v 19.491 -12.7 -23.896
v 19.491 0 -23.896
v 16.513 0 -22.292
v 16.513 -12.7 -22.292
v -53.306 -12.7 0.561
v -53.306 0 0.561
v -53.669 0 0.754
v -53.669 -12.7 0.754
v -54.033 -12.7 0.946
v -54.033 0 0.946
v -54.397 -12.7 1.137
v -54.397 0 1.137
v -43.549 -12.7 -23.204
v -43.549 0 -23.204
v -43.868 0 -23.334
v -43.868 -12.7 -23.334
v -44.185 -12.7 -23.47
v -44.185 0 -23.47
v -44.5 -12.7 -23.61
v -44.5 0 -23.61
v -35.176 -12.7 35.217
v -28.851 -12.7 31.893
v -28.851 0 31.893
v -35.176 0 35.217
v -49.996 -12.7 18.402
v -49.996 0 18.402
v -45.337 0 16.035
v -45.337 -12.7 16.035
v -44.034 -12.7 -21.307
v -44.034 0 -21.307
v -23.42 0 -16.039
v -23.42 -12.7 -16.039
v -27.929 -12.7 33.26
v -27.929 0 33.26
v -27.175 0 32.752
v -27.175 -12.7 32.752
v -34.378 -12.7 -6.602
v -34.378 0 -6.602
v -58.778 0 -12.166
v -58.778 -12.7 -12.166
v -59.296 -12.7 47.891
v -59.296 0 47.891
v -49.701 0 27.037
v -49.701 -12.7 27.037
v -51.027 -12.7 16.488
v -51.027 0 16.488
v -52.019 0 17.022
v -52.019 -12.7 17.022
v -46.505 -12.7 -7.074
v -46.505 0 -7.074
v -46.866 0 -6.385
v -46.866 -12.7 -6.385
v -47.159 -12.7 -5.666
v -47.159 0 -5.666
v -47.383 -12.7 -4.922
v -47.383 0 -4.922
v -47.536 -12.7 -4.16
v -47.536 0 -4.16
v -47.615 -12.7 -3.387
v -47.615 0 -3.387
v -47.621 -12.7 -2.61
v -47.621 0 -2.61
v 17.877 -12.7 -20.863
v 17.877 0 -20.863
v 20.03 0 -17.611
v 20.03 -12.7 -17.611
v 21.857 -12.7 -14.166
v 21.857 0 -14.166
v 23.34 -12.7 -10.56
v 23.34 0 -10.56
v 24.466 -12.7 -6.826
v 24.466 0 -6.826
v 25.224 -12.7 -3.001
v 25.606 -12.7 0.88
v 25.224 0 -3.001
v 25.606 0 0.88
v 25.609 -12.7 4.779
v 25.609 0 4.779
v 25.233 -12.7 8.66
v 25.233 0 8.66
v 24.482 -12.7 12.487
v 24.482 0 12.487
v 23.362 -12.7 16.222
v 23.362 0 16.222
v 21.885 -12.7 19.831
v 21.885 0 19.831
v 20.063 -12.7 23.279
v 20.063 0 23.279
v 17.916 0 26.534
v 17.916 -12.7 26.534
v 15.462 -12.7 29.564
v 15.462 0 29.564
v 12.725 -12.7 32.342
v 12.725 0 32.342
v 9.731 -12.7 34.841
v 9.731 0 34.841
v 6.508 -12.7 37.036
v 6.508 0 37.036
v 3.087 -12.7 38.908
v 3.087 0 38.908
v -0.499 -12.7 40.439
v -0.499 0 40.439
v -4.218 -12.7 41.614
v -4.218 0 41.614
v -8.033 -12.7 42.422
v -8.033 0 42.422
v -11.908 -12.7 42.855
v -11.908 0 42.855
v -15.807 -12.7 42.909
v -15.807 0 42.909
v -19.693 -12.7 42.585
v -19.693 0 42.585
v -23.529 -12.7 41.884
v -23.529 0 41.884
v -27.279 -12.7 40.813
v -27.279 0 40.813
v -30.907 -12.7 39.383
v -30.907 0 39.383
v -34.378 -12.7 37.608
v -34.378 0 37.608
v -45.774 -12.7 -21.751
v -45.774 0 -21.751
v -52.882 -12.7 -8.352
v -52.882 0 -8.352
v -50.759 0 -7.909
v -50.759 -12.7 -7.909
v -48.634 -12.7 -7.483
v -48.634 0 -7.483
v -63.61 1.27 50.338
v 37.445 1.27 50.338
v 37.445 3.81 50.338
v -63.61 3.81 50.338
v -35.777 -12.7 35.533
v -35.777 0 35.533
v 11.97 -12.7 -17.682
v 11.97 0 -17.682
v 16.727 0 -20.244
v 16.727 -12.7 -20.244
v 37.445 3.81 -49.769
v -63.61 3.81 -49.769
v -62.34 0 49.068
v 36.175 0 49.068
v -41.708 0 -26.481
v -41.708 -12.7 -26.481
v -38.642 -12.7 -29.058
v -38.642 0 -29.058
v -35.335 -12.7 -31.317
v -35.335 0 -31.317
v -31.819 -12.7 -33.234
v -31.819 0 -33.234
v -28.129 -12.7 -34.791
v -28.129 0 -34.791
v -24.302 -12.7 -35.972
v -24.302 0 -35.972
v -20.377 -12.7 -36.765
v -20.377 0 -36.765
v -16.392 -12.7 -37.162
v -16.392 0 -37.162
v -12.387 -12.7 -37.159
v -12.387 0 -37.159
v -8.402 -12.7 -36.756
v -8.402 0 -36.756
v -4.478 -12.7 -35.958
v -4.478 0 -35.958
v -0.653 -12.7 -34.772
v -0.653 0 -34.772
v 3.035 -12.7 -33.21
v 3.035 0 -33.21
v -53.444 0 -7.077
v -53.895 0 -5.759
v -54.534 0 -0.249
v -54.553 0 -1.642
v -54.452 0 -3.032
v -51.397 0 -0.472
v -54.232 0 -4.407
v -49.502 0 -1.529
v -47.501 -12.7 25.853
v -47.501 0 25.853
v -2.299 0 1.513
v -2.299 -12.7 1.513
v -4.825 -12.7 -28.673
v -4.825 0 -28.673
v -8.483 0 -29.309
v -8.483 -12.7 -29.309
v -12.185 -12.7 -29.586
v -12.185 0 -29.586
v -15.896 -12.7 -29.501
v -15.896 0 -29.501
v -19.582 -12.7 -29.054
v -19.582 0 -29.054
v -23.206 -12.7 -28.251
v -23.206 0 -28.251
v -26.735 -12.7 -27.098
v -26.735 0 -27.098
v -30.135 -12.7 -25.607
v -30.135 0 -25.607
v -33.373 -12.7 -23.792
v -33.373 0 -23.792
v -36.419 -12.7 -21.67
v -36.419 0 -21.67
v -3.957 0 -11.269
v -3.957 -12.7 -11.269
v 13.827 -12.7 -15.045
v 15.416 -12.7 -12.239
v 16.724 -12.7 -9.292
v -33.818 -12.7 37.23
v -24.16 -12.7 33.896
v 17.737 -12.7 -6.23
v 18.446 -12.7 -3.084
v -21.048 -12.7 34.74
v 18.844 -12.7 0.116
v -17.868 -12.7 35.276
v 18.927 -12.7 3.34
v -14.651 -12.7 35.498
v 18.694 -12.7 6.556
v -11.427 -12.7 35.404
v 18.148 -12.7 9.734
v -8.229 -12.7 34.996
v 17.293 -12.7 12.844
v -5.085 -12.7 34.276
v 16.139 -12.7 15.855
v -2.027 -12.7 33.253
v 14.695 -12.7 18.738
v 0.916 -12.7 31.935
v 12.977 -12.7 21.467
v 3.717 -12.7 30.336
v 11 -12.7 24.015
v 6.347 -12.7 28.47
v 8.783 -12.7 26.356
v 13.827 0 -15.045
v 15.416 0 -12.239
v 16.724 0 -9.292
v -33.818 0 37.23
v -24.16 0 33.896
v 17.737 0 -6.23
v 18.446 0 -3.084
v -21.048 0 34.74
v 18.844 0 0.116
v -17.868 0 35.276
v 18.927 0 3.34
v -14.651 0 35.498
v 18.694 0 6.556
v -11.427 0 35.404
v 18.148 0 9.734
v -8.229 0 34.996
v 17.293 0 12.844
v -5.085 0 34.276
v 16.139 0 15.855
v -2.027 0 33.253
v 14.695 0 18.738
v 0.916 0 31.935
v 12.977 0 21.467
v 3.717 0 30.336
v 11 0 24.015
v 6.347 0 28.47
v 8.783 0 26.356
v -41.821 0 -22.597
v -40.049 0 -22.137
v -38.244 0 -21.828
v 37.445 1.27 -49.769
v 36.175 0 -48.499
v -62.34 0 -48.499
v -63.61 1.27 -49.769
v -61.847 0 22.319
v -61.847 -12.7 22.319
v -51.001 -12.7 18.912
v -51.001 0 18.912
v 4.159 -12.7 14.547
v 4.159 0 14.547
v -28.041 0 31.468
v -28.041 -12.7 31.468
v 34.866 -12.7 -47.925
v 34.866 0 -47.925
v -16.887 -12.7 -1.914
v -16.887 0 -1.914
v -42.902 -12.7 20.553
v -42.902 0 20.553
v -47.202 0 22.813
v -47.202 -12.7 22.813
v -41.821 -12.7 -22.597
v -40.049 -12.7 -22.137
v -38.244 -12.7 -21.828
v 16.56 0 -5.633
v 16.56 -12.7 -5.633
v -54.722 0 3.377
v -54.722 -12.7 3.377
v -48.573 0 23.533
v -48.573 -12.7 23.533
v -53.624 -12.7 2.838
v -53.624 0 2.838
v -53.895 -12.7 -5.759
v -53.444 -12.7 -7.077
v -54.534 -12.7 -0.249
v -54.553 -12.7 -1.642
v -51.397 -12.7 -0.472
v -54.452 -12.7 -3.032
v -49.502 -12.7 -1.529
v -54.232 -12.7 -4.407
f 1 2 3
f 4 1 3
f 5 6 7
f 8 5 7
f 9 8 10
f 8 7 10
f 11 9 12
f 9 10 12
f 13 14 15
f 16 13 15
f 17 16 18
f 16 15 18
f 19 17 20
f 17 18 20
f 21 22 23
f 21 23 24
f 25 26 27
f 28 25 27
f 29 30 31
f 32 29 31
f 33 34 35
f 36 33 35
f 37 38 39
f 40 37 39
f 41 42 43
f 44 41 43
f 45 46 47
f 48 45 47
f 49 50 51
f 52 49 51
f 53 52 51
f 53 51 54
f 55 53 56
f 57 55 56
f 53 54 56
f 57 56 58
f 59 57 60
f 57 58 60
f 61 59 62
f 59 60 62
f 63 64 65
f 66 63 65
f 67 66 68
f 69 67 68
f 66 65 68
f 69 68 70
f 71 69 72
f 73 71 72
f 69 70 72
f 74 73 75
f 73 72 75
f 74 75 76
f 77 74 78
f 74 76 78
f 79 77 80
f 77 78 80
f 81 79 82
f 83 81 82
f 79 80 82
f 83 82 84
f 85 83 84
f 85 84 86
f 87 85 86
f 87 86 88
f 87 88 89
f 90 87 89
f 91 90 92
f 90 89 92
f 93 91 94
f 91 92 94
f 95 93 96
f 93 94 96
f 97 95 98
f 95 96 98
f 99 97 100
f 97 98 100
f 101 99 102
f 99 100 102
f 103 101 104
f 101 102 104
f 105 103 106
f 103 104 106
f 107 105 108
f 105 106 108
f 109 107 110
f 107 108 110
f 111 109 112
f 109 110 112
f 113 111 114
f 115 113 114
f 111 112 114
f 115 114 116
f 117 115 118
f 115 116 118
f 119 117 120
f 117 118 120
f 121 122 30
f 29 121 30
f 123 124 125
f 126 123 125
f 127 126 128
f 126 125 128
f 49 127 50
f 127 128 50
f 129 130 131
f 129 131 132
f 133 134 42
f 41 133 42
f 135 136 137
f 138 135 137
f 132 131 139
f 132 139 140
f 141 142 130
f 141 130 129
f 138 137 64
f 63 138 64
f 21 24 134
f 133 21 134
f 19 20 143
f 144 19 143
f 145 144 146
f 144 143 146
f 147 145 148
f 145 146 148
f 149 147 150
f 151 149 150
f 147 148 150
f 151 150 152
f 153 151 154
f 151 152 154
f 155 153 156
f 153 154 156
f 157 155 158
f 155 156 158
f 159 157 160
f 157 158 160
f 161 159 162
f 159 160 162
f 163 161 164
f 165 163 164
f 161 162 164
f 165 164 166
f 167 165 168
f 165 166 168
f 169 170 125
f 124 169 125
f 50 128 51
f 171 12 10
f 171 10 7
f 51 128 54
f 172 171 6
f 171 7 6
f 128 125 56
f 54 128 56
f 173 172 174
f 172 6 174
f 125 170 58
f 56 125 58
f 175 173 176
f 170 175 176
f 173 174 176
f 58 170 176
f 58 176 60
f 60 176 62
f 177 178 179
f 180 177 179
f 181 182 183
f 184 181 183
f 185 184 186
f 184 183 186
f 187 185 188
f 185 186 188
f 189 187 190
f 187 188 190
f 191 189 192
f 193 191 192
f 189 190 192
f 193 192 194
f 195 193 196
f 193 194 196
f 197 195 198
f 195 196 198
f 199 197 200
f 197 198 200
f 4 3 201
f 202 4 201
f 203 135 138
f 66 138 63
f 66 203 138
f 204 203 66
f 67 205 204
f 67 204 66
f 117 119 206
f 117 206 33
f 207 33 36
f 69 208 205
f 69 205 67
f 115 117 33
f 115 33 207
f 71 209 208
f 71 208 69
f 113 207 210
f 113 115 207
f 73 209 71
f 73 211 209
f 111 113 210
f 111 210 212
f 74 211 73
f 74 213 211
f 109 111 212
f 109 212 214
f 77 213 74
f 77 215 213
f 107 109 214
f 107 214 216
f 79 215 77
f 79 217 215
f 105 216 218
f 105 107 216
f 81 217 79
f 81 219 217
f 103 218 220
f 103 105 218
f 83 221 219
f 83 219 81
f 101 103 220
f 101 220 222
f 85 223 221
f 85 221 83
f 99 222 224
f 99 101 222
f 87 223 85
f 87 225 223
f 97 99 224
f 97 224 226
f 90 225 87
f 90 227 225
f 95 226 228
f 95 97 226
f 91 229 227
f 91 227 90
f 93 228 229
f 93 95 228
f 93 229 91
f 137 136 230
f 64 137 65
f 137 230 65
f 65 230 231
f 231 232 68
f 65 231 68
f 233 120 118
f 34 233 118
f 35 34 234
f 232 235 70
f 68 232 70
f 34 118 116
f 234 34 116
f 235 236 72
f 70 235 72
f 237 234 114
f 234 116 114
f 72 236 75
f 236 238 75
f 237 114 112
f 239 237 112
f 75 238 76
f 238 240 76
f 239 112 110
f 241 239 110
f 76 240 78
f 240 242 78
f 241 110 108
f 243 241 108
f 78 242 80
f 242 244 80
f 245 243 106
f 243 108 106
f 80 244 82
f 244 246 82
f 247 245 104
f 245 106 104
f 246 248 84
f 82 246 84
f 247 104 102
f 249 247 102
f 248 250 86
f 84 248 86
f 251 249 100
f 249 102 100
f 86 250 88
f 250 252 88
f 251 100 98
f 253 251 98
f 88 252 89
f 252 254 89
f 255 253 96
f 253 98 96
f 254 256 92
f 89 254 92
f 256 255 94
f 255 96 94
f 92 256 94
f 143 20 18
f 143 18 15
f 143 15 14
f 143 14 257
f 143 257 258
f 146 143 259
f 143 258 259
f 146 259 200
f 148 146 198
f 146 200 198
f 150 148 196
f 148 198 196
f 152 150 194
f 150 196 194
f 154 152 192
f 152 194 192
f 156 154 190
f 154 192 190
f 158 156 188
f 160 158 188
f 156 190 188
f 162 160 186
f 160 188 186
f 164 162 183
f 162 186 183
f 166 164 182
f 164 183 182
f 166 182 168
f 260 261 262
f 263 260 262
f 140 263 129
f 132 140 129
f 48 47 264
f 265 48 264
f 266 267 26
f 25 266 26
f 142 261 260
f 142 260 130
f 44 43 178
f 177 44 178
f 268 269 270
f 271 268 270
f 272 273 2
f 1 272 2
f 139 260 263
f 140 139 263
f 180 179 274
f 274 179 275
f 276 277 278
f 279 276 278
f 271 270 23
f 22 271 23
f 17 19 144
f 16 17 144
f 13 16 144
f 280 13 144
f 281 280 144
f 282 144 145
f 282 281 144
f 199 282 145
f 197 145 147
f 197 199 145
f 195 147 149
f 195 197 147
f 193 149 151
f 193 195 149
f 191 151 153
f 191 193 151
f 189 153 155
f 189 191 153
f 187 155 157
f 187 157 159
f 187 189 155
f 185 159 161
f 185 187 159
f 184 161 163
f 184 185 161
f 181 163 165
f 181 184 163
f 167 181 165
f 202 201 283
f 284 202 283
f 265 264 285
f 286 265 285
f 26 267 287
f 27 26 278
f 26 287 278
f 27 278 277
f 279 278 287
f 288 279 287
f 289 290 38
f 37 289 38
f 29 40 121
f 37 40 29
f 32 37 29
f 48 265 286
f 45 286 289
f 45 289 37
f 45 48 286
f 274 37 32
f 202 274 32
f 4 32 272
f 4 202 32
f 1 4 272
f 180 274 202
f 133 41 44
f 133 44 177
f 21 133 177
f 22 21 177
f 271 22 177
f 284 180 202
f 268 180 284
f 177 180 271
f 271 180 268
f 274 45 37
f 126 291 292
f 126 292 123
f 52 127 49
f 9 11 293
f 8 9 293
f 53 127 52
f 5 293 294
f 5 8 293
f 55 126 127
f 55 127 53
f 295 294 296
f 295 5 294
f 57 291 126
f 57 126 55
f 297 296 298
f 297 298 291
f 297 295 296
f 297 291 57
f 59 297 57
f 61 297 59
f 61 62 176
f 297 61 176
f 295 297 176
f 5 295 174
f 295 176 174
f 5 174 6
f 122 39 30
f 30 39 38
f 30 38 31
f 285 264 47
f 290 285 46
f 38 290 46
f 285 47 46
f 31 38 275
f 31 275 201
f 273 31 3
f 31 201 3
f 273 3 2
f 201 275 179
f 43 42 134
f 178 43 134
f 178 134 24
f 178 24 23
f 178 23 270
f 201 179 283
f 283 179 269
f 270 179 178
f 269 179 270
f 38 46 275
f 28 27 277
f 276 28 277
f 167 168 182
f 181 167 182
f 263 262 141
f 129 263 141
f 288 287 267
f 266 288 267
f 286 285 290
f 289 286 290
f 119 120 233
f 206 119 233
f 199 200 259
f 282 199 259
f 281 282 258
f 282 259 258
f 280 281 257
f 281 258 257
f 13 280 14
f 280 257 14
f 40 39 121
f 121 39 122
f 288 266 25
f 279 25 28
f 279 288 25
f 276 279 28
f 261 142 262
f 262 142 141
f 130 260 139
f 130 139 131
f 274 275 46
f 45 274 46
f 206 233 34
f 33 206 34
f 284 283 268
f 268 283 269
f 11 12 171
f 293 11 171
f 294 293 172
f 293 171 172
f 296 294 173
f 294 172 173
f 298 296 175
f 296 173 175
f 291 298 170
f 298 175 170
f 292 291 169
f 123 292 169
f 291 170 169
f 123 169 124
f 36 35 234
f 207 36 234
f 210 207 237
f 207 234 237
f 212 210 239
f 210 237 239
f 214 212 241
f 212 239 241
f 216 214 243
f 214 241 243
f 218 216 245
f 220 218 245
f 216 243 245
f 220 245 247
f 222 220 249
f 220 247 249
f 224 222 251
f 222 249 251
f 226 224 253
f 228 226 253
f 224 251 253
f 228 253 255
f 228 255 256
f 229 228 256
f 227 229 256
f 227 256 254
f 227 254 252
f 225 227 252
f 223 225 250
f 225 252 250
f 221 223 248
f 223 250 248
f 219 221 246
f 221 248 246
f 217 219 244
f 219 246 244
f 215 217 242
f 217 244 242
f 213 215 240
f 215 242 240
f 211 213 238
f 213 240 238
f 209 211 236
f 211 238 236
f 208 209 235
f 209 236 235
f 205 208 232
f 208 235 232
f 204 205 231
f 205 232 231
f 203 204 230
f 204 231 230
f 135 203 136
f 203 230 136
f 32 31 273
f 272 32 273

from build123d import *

# Parameters (mm, degrees)
F1_DEPTH = 12.7
F2_W     = 101.055275
F2_H     = 100.107301
F3_DEPTH = 3.81
F4_SIZE  = 1.27


with BuildPart() as f1:
    # F0 (on Front) → F1 (new body)
    with BuildSketch(Plane.XZ):
        Polygon((-35.777155, 35.532784), (-59.295878, 47.891356), (-49.700695, 27.037437), (-47.500801, 25.852879), (-2.298983, 1.513438), (-16.886974, -1.914341), (-51.027356, 16.487568), (-52.019487, 17.022334), (-61.846677, 22.319259), (-54.721754, 3.376882), (-53.6238, 2.838316), (-34.378473, -6.601848), (-58.778383, -12.165563), (-45.774035, -21.751242), (-44.033876, -21.3066), (-23.419714, -16.039314), (34.866069, -47.924664), (19.491419, -23.895705), (16.512845, -22.291857), (-3.957492, -11.269368), (16.560305, -5.632611), (4.15944, 14.54698), (-28.041071, 31.467642), (-28.850746, 31.893108), (-35.175598, 35.216679), align=None)
        with BuildLine():
            ThreePointArc((-53.305935, 0.560932), (-53.850765, 0.84994), (-54.396643, 1.136963))
            ThreePointArc((-54.396643, 1.136963), (-54.356654, -3.721866), (-52.881577, -8.351549))
            ThreePointArc((-52.881577, -8.351549), (-49.696834, -7.694424), (-46.504783, -7.073763))
            ThreePointArc((-46.504783, -7.073763), (-47.383367, -4.921864), (-47.620802, -2.609679))
            ThreePointArc((-47.620802, -2.609679), (-50.448146, -0.997078), (-53.305935, 0.560932))
        make_face()
        Polygon((-47.202257, 22.813042), (-48.572631, 23.533143), (-51.00082, 18.912229), (-49.995659, 18.401638), (-45.337372, 16.035374), (-42.902117, 20.553413), align=None)
        with BuildLine():
            ThreePointArc((17.877233, -20.86272), (15.461552, 29.564334), (-34.378473, 37.607666))
            Line((-34.378473, 37.607666), (-33.818354, 37.230089))
            Line((-33.818354, 37.230089), (-27.929191, 33.260194))
            Line((-27.929191, 33.260194), (-27.175291, 32.751989))
            ThreePointArc((-27.175291, 32.751989), (12.01935, 22.765057), (11.969992, -17.681898))
            Line((11.969992, -17.681898), (16.727284, -20.243517))
            Line((16.727284, -20.243517), (17.877233, -20.86272))
        make_face()
        with BuildLine():
            ThreePointArc((-36.41942, -21.670096), (-40.048735, -22.137262), (-43.549058, -23.203992))
            ThreePointArc((-43.549058, -23.203992), (-44.027037, -23.401335), (-44.500208, -23.609942))
            ThreePointArc((-44.500208, -23.609942), (-22.349599, -36.417166), (3.035236, -33.210202))
            Line((3.035236, -33.210202), (-4.825023, -28.673272))
            ThreePointArc((-4.825023, -28.673272), (-21.403603, -28.696839), (-36.41942, -21.670096))
        make_face()
    extrude(amount=F1_DEPTH)


with BuildPart() as f3:
    # F2 (on face) → F3 (new body)
    with BuildSketch(Plane(origin=(0, 0, 0), x_dir=(-1, 0, 0), z_dir=(0, 1, 0))):
        with Locations((13.0822, 0.284398)):
            Rectangle(F2_W, F2_H)
    extrude(amount=F3_DEPTH)

    # F4
    f4_edges = [f3.edges().sort_by_distance(p)[0] for p in [
        (-13.082201, 0, 50.338048),
        (-63.609838, 0, 0.284398),
        (-13.082201, 0, -49.769253),
        (37.445437, 0, 0.284398),
    ]]
    chamfer(f4_edges, length=F4_SIZE)


solid = Compound([f1.part, f3.part])
